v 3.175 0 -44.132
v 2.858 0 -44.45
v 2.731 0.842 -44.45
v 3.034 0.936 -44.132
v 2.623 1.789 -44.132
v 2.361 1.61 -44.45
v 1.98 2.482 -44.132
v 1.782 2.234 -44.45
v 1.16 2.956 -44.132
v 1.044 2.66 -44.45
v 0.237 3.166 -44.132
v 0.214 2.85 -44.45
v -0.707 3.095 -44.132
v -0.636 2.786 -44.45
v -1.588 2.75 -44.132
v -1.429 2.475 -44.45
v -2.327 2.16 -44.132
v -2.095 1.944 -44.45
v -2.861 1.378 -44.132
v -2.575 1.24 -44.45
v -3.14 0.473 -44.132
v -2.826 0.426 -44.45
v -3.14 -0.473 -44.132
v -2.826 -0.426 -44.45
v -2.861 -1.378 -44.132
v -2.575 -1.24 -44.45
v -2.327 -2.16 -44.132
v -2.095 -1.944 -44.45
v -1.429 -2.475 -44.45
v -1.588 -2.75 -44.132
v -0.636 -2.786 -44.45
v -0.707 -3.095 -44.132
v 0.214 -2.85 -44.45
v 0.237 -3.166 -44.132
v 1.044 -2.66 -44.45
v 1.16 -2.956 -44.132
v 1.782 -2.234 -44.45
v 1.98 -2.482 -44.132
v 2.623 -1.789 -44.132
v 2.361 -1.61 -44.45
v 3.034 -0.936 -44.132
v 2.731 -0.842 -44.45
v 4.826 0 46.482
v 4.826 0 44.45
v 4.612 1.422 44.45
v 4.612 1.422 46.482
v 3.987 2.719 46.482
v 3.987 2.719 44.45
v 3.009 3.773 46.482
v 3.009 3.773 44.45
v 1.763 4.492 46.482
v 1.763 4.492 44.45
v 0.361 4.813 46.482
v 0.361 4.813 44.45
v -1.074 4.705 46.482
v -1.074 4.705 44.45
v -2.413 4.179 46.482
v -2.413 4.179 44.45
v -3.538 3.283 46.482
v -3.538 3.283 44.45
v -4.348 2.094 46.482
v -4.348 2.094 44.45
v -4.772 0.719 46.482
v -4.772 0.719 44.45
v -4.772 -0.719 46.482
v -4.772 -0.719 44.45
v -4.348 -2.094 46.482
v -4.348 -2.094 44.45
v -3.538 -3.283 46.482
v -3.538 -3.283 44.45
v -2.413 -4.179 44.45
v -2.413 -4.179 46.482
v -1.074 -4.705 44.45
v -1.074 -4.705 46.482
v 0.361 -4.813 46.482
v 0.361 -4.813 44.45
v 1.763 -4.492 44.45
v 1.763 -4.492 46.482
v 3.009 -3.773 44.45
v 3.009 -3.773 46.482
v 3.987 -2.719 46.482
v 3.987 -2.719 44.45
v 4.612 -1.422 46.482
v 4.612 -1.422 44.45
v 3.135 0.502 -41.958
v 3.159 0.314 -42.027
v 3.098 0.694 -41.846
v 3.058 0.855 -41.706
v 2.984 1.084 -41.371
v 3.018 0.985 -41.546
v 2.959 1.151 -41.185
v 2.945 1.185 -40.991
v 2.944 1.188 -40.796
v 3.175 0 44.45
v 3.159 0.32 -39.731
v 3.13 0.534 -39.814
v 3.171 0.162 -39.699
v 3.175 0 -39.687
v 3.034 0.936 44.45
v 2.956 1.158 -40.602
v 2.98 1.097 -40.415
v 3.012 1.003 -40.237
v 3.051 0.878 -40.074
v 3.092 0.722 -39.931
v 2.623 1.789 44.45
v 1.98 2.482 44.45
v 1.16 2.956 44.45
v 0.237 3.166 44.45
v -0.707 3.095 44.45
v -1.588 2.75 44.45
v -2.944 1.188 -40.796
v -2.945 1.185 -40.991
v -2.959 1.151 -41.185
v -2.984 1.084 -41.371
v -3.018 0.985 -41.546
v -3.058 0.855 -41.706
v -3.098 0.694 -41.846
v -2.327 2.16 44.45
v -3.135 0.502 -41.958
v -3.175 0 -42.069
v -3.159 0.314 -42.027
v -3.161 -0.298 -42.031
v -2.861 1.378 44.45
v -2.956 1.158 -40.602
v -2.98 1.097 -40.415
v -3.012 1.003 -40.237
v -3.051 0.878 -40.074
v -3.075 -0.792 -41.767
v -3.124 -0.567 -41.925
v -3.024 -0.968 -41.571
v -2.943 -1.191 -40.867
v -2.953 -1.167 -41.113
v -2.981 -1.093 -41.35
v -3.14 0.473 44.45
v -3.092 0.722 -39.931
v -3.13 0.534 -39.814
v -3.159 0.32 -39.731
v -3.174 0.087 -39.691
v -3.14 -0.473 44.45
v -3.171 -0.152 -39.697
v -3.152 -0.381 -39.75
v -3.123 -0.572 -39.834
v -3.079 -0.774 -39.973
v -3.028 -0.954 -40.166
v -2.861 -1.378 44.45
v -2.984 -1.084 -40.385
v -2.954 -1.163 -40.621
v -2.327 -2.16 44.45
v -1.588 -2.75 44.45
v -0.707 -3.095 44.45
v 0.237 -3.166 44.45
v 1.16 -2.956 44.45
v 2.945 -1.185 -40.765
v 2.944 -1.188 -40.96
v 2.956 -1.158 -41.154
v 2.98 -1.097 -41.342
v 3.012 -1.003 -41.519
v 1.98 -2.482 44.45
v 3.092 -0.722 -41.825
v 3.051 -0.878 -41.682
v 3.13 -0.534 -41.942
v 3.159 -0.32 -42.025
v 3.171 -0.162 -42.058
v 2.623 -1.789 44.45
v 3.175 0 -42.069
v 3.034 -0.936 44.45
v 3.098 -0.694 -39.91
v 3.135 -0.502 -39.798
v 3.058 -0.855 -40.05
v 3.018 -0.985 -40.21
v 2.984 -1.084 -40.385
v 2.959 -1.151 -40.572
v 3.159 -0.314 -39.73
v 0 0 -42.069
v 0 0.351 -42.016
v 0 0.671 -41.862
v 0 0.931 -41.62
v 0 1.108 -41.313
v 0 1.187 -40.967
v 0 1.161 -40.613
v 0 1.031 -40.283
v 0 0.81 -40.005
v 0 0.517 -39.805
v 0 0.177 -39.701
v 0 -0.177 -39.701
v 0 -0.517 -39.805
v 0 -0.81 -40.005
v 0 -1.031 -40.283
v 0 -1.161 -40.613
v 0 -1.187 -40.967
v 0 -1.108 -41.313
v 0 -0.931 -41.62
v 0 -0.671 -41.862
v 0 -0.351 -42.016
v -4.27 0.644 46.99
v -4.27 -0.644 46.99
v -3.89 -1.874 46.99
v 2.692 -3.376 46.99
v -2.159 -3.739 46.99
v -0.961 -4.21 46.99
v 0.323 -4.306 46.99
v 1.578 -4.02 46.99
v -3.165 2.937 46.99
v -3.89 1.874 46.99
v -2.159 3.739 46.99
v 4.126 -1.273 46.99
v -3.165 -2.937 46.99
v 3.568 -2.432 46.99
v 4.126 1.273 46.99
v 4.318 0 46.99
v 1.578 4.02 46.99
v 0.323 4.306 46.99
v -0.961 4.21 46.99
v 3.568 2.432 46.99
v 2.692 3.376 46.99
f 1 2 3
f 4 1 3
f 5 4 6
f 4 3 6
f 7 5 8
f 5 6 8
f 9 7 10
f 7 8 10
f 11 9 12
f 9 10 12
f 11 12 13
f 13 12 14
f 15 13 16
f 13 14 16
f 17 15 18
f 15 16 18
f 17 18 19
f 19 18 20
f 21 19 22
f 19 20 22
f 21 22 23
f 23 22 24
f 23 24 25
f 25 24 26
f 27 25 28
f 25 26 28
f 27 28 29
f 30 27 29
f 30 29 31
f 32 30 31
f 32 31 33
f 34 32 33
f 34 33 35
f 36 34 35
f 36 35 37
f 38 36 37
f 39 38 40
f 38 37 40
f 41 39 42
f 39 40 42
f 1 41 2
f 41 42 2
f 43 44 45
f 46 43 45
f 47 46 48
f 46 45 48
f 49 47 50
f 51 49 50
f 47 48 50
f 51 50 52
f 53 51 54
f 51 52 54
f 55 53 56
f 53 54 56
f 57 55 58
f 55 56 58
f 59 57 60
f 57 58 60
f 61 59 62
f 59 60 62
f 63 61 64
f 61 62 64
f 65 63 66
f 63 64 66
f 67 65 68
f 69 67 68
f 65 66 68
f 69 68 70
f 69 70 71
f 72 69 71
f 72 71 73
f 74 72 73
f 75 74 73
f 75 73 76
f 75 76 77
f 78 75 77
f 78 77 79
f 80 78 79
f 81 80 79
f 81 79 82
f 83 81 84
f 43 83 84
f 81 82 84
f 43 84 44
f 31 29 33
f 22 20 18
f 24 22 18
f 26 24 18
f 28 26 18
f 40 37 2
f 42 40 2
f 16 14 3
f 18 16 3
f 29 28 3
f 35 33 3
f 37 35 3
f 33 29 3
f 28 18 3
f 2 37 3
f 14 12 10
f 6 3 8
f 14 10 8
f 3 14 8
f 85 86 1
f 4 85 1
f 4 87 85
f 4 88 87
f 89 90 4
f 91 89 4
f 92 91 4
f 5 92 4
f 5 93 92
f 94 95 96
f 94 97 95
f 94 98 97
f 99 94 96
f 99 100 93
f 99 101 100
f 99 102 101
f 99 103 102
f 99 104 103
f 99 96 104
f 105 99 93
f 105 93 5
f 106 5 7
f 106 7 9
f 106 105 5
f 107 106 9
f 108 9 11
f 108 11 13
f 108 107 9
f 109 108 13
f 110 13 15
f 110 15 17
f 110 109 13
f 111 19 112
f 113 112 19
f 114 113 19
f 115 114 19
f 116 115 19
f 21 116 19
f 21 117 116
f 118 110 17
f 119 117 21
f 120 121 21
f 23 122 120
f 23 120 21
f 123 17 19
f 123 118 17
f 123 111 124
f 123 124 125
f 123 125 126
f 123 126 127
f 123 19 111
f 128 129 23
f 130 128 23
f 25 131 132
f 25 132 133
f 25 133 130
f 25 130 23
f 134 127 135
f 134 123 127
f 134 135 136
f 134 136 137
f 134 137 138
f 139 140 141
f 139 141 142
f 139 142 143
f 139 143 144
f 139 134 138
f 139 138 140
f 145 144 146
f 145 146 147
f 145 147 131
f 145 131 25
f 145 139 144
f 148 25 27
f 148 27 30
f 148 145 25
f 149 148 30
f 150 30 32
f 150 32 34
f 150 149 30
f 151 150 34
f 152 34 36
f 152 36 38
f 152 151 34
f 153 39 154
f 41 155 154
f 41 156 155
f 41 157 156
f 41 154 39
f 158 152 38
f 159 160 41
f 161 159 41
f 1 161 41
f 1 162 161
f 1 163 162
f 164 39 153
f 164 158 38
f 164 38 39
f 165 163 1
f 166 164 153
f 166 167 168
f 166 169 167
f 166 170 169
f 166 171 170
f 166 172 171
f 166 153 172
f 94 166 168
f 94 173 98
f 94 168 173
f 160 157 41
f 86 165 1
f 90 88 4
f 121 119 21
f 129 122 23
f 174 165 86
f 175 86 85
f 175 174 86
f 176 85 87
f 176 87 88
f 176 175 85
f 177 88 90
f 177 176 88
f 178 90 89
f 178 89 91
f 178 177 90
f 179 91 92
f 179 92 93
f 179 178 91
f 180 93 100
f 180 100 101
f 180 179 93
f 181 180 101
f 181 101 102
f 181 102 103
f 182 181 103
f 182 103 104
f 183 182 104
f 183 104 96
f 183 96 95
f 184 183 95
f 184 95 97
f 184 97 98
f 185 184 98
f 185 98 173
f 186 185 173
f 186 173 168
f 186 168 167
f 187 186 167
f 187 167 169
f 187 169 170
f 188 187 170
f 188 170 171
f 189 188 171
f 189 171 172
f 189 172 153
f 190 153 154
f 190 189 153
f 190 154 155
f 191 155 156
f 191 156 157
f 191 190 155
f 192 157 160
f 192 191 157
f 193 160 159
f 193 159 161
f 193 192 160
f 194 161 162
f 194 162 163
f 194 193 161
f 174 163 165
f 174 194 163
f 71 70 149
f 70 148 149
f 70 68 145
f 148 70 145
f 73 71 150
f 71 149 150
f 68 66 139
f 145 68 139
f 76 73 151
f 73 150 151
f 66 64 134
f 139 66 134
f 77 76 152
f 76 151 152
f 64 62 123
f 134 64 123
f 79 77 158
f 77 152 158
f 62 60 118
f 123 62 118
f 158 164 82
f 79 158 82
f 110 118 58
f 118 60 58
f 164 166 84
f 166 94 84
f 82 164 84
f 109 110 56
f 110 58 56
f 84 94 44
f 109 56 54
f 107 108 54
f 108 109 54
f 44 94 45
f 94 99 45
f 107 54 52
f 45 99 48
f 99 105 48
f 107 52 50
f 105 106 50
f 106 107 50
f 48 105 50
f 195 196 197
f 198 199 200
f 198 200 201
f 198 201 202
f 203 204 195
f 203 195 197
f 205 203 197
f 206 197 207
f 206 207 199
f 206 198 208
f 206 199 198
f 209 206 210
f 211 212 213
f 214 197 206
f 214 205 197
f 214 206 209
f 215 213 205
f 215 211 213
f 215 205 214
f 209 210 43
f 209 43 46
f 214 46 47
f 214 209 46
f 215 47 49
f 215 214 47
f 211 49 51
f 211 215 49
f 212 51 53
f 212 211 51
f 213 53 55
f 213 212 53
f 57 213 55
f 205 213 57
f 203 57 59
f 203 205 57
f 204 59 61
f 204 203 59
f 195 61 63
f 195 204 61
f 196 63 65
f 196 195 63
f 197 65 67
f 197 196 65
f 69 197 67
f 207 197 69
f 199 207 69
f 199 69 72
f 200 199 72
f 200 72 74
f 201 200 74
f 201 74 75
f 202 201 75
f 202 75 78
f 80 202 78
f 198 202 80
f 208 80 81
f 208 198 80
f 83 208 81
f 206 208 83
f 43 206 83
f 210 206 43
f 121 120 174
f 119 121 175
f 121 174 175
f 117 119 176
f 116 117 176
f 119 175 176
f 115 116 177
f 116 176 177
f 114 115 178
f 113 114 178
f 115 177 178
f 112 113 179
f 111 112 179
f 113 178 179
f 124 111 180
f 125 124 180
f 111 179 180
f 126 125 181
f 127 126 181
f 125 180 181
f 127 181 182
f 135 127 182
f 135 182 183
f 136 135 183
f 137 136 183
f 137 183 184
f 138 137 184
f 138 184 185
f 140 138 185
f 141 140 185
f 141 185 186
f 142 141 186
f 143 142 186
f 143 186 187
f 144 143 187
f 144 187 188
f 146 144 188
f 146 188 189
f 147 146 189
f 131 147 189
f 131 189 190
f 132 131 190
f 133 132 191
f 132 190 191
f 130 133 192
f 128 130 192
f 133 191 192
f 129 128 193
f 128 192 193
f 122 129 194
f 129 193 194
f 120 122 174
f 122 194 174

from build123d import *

# Parameters (mm, degrees)
SKETCH1_R           = 3.175
EXTRUDE1_DEPTH      = 44.45
SKETCH2_R           = 4.826
EXTRUDE2_DEPTH      = 2.54
CHAMFER1_SIZE       = 0.508
SKETCH3_R           = 1.190625
EXTRUDE3_DEPTH      = 5.826
EXTRUDE3_DEPTH_BACK = 5.826
CHAMFER2_SIZE       = 0.3175


with BuildPart() as part:
    # Sketch1 → Extrude1 (new body, symmetric)
    with BuildSketch(Plane.XY):
        Circle(SKETCH1_R)
    extrude(amount=EXTRUDE1_DEPTH, both=True)

    # Sketch2 → Extrude2 (add)
    with BuildSketch(Plane.XY.offset(44.45)):
        Circle(SKETCH2_R)
    extrude(amount=EXTRUDE2_DEPTH)

    # Chamfer1
    chamfer1_edges = [part.edges().sort_by_distance(p)[0] for p in [
        (-4.826, 0, 46.99),
    ]]
    chamfer(chamfer1_edges, length=CHAMFER1_SIZE)

    # Sketch3 → Extrude3 (cut, two sides)
    with BuildSketch(Plane(origin=(0, 0, 0), x_dir=(0, 0, -1), z_dir=(1, 0, 0))) as extrude3_sk:
        with Locations((40.878125, 0)):
            Circle(SKETCH3_R)
    extrude(amount=EXTRUDE3_DEPTH, mode=Mode.SUBTRACT)
    extrude(extrude3_sk.sketch, amount=-EXTRUDE3_DEPTH_BACK, mode=Mode.SUBTRACT)

    # Chamfer2
    chamfer2_edges = [part.edges().sort_by_distance(p)[0] for p in [
        (-3.175, 0, -44.45),
    ]]
    chamfer(chamfer2_edges, length=CHAMFER2_SIZE)


solid = part.part
